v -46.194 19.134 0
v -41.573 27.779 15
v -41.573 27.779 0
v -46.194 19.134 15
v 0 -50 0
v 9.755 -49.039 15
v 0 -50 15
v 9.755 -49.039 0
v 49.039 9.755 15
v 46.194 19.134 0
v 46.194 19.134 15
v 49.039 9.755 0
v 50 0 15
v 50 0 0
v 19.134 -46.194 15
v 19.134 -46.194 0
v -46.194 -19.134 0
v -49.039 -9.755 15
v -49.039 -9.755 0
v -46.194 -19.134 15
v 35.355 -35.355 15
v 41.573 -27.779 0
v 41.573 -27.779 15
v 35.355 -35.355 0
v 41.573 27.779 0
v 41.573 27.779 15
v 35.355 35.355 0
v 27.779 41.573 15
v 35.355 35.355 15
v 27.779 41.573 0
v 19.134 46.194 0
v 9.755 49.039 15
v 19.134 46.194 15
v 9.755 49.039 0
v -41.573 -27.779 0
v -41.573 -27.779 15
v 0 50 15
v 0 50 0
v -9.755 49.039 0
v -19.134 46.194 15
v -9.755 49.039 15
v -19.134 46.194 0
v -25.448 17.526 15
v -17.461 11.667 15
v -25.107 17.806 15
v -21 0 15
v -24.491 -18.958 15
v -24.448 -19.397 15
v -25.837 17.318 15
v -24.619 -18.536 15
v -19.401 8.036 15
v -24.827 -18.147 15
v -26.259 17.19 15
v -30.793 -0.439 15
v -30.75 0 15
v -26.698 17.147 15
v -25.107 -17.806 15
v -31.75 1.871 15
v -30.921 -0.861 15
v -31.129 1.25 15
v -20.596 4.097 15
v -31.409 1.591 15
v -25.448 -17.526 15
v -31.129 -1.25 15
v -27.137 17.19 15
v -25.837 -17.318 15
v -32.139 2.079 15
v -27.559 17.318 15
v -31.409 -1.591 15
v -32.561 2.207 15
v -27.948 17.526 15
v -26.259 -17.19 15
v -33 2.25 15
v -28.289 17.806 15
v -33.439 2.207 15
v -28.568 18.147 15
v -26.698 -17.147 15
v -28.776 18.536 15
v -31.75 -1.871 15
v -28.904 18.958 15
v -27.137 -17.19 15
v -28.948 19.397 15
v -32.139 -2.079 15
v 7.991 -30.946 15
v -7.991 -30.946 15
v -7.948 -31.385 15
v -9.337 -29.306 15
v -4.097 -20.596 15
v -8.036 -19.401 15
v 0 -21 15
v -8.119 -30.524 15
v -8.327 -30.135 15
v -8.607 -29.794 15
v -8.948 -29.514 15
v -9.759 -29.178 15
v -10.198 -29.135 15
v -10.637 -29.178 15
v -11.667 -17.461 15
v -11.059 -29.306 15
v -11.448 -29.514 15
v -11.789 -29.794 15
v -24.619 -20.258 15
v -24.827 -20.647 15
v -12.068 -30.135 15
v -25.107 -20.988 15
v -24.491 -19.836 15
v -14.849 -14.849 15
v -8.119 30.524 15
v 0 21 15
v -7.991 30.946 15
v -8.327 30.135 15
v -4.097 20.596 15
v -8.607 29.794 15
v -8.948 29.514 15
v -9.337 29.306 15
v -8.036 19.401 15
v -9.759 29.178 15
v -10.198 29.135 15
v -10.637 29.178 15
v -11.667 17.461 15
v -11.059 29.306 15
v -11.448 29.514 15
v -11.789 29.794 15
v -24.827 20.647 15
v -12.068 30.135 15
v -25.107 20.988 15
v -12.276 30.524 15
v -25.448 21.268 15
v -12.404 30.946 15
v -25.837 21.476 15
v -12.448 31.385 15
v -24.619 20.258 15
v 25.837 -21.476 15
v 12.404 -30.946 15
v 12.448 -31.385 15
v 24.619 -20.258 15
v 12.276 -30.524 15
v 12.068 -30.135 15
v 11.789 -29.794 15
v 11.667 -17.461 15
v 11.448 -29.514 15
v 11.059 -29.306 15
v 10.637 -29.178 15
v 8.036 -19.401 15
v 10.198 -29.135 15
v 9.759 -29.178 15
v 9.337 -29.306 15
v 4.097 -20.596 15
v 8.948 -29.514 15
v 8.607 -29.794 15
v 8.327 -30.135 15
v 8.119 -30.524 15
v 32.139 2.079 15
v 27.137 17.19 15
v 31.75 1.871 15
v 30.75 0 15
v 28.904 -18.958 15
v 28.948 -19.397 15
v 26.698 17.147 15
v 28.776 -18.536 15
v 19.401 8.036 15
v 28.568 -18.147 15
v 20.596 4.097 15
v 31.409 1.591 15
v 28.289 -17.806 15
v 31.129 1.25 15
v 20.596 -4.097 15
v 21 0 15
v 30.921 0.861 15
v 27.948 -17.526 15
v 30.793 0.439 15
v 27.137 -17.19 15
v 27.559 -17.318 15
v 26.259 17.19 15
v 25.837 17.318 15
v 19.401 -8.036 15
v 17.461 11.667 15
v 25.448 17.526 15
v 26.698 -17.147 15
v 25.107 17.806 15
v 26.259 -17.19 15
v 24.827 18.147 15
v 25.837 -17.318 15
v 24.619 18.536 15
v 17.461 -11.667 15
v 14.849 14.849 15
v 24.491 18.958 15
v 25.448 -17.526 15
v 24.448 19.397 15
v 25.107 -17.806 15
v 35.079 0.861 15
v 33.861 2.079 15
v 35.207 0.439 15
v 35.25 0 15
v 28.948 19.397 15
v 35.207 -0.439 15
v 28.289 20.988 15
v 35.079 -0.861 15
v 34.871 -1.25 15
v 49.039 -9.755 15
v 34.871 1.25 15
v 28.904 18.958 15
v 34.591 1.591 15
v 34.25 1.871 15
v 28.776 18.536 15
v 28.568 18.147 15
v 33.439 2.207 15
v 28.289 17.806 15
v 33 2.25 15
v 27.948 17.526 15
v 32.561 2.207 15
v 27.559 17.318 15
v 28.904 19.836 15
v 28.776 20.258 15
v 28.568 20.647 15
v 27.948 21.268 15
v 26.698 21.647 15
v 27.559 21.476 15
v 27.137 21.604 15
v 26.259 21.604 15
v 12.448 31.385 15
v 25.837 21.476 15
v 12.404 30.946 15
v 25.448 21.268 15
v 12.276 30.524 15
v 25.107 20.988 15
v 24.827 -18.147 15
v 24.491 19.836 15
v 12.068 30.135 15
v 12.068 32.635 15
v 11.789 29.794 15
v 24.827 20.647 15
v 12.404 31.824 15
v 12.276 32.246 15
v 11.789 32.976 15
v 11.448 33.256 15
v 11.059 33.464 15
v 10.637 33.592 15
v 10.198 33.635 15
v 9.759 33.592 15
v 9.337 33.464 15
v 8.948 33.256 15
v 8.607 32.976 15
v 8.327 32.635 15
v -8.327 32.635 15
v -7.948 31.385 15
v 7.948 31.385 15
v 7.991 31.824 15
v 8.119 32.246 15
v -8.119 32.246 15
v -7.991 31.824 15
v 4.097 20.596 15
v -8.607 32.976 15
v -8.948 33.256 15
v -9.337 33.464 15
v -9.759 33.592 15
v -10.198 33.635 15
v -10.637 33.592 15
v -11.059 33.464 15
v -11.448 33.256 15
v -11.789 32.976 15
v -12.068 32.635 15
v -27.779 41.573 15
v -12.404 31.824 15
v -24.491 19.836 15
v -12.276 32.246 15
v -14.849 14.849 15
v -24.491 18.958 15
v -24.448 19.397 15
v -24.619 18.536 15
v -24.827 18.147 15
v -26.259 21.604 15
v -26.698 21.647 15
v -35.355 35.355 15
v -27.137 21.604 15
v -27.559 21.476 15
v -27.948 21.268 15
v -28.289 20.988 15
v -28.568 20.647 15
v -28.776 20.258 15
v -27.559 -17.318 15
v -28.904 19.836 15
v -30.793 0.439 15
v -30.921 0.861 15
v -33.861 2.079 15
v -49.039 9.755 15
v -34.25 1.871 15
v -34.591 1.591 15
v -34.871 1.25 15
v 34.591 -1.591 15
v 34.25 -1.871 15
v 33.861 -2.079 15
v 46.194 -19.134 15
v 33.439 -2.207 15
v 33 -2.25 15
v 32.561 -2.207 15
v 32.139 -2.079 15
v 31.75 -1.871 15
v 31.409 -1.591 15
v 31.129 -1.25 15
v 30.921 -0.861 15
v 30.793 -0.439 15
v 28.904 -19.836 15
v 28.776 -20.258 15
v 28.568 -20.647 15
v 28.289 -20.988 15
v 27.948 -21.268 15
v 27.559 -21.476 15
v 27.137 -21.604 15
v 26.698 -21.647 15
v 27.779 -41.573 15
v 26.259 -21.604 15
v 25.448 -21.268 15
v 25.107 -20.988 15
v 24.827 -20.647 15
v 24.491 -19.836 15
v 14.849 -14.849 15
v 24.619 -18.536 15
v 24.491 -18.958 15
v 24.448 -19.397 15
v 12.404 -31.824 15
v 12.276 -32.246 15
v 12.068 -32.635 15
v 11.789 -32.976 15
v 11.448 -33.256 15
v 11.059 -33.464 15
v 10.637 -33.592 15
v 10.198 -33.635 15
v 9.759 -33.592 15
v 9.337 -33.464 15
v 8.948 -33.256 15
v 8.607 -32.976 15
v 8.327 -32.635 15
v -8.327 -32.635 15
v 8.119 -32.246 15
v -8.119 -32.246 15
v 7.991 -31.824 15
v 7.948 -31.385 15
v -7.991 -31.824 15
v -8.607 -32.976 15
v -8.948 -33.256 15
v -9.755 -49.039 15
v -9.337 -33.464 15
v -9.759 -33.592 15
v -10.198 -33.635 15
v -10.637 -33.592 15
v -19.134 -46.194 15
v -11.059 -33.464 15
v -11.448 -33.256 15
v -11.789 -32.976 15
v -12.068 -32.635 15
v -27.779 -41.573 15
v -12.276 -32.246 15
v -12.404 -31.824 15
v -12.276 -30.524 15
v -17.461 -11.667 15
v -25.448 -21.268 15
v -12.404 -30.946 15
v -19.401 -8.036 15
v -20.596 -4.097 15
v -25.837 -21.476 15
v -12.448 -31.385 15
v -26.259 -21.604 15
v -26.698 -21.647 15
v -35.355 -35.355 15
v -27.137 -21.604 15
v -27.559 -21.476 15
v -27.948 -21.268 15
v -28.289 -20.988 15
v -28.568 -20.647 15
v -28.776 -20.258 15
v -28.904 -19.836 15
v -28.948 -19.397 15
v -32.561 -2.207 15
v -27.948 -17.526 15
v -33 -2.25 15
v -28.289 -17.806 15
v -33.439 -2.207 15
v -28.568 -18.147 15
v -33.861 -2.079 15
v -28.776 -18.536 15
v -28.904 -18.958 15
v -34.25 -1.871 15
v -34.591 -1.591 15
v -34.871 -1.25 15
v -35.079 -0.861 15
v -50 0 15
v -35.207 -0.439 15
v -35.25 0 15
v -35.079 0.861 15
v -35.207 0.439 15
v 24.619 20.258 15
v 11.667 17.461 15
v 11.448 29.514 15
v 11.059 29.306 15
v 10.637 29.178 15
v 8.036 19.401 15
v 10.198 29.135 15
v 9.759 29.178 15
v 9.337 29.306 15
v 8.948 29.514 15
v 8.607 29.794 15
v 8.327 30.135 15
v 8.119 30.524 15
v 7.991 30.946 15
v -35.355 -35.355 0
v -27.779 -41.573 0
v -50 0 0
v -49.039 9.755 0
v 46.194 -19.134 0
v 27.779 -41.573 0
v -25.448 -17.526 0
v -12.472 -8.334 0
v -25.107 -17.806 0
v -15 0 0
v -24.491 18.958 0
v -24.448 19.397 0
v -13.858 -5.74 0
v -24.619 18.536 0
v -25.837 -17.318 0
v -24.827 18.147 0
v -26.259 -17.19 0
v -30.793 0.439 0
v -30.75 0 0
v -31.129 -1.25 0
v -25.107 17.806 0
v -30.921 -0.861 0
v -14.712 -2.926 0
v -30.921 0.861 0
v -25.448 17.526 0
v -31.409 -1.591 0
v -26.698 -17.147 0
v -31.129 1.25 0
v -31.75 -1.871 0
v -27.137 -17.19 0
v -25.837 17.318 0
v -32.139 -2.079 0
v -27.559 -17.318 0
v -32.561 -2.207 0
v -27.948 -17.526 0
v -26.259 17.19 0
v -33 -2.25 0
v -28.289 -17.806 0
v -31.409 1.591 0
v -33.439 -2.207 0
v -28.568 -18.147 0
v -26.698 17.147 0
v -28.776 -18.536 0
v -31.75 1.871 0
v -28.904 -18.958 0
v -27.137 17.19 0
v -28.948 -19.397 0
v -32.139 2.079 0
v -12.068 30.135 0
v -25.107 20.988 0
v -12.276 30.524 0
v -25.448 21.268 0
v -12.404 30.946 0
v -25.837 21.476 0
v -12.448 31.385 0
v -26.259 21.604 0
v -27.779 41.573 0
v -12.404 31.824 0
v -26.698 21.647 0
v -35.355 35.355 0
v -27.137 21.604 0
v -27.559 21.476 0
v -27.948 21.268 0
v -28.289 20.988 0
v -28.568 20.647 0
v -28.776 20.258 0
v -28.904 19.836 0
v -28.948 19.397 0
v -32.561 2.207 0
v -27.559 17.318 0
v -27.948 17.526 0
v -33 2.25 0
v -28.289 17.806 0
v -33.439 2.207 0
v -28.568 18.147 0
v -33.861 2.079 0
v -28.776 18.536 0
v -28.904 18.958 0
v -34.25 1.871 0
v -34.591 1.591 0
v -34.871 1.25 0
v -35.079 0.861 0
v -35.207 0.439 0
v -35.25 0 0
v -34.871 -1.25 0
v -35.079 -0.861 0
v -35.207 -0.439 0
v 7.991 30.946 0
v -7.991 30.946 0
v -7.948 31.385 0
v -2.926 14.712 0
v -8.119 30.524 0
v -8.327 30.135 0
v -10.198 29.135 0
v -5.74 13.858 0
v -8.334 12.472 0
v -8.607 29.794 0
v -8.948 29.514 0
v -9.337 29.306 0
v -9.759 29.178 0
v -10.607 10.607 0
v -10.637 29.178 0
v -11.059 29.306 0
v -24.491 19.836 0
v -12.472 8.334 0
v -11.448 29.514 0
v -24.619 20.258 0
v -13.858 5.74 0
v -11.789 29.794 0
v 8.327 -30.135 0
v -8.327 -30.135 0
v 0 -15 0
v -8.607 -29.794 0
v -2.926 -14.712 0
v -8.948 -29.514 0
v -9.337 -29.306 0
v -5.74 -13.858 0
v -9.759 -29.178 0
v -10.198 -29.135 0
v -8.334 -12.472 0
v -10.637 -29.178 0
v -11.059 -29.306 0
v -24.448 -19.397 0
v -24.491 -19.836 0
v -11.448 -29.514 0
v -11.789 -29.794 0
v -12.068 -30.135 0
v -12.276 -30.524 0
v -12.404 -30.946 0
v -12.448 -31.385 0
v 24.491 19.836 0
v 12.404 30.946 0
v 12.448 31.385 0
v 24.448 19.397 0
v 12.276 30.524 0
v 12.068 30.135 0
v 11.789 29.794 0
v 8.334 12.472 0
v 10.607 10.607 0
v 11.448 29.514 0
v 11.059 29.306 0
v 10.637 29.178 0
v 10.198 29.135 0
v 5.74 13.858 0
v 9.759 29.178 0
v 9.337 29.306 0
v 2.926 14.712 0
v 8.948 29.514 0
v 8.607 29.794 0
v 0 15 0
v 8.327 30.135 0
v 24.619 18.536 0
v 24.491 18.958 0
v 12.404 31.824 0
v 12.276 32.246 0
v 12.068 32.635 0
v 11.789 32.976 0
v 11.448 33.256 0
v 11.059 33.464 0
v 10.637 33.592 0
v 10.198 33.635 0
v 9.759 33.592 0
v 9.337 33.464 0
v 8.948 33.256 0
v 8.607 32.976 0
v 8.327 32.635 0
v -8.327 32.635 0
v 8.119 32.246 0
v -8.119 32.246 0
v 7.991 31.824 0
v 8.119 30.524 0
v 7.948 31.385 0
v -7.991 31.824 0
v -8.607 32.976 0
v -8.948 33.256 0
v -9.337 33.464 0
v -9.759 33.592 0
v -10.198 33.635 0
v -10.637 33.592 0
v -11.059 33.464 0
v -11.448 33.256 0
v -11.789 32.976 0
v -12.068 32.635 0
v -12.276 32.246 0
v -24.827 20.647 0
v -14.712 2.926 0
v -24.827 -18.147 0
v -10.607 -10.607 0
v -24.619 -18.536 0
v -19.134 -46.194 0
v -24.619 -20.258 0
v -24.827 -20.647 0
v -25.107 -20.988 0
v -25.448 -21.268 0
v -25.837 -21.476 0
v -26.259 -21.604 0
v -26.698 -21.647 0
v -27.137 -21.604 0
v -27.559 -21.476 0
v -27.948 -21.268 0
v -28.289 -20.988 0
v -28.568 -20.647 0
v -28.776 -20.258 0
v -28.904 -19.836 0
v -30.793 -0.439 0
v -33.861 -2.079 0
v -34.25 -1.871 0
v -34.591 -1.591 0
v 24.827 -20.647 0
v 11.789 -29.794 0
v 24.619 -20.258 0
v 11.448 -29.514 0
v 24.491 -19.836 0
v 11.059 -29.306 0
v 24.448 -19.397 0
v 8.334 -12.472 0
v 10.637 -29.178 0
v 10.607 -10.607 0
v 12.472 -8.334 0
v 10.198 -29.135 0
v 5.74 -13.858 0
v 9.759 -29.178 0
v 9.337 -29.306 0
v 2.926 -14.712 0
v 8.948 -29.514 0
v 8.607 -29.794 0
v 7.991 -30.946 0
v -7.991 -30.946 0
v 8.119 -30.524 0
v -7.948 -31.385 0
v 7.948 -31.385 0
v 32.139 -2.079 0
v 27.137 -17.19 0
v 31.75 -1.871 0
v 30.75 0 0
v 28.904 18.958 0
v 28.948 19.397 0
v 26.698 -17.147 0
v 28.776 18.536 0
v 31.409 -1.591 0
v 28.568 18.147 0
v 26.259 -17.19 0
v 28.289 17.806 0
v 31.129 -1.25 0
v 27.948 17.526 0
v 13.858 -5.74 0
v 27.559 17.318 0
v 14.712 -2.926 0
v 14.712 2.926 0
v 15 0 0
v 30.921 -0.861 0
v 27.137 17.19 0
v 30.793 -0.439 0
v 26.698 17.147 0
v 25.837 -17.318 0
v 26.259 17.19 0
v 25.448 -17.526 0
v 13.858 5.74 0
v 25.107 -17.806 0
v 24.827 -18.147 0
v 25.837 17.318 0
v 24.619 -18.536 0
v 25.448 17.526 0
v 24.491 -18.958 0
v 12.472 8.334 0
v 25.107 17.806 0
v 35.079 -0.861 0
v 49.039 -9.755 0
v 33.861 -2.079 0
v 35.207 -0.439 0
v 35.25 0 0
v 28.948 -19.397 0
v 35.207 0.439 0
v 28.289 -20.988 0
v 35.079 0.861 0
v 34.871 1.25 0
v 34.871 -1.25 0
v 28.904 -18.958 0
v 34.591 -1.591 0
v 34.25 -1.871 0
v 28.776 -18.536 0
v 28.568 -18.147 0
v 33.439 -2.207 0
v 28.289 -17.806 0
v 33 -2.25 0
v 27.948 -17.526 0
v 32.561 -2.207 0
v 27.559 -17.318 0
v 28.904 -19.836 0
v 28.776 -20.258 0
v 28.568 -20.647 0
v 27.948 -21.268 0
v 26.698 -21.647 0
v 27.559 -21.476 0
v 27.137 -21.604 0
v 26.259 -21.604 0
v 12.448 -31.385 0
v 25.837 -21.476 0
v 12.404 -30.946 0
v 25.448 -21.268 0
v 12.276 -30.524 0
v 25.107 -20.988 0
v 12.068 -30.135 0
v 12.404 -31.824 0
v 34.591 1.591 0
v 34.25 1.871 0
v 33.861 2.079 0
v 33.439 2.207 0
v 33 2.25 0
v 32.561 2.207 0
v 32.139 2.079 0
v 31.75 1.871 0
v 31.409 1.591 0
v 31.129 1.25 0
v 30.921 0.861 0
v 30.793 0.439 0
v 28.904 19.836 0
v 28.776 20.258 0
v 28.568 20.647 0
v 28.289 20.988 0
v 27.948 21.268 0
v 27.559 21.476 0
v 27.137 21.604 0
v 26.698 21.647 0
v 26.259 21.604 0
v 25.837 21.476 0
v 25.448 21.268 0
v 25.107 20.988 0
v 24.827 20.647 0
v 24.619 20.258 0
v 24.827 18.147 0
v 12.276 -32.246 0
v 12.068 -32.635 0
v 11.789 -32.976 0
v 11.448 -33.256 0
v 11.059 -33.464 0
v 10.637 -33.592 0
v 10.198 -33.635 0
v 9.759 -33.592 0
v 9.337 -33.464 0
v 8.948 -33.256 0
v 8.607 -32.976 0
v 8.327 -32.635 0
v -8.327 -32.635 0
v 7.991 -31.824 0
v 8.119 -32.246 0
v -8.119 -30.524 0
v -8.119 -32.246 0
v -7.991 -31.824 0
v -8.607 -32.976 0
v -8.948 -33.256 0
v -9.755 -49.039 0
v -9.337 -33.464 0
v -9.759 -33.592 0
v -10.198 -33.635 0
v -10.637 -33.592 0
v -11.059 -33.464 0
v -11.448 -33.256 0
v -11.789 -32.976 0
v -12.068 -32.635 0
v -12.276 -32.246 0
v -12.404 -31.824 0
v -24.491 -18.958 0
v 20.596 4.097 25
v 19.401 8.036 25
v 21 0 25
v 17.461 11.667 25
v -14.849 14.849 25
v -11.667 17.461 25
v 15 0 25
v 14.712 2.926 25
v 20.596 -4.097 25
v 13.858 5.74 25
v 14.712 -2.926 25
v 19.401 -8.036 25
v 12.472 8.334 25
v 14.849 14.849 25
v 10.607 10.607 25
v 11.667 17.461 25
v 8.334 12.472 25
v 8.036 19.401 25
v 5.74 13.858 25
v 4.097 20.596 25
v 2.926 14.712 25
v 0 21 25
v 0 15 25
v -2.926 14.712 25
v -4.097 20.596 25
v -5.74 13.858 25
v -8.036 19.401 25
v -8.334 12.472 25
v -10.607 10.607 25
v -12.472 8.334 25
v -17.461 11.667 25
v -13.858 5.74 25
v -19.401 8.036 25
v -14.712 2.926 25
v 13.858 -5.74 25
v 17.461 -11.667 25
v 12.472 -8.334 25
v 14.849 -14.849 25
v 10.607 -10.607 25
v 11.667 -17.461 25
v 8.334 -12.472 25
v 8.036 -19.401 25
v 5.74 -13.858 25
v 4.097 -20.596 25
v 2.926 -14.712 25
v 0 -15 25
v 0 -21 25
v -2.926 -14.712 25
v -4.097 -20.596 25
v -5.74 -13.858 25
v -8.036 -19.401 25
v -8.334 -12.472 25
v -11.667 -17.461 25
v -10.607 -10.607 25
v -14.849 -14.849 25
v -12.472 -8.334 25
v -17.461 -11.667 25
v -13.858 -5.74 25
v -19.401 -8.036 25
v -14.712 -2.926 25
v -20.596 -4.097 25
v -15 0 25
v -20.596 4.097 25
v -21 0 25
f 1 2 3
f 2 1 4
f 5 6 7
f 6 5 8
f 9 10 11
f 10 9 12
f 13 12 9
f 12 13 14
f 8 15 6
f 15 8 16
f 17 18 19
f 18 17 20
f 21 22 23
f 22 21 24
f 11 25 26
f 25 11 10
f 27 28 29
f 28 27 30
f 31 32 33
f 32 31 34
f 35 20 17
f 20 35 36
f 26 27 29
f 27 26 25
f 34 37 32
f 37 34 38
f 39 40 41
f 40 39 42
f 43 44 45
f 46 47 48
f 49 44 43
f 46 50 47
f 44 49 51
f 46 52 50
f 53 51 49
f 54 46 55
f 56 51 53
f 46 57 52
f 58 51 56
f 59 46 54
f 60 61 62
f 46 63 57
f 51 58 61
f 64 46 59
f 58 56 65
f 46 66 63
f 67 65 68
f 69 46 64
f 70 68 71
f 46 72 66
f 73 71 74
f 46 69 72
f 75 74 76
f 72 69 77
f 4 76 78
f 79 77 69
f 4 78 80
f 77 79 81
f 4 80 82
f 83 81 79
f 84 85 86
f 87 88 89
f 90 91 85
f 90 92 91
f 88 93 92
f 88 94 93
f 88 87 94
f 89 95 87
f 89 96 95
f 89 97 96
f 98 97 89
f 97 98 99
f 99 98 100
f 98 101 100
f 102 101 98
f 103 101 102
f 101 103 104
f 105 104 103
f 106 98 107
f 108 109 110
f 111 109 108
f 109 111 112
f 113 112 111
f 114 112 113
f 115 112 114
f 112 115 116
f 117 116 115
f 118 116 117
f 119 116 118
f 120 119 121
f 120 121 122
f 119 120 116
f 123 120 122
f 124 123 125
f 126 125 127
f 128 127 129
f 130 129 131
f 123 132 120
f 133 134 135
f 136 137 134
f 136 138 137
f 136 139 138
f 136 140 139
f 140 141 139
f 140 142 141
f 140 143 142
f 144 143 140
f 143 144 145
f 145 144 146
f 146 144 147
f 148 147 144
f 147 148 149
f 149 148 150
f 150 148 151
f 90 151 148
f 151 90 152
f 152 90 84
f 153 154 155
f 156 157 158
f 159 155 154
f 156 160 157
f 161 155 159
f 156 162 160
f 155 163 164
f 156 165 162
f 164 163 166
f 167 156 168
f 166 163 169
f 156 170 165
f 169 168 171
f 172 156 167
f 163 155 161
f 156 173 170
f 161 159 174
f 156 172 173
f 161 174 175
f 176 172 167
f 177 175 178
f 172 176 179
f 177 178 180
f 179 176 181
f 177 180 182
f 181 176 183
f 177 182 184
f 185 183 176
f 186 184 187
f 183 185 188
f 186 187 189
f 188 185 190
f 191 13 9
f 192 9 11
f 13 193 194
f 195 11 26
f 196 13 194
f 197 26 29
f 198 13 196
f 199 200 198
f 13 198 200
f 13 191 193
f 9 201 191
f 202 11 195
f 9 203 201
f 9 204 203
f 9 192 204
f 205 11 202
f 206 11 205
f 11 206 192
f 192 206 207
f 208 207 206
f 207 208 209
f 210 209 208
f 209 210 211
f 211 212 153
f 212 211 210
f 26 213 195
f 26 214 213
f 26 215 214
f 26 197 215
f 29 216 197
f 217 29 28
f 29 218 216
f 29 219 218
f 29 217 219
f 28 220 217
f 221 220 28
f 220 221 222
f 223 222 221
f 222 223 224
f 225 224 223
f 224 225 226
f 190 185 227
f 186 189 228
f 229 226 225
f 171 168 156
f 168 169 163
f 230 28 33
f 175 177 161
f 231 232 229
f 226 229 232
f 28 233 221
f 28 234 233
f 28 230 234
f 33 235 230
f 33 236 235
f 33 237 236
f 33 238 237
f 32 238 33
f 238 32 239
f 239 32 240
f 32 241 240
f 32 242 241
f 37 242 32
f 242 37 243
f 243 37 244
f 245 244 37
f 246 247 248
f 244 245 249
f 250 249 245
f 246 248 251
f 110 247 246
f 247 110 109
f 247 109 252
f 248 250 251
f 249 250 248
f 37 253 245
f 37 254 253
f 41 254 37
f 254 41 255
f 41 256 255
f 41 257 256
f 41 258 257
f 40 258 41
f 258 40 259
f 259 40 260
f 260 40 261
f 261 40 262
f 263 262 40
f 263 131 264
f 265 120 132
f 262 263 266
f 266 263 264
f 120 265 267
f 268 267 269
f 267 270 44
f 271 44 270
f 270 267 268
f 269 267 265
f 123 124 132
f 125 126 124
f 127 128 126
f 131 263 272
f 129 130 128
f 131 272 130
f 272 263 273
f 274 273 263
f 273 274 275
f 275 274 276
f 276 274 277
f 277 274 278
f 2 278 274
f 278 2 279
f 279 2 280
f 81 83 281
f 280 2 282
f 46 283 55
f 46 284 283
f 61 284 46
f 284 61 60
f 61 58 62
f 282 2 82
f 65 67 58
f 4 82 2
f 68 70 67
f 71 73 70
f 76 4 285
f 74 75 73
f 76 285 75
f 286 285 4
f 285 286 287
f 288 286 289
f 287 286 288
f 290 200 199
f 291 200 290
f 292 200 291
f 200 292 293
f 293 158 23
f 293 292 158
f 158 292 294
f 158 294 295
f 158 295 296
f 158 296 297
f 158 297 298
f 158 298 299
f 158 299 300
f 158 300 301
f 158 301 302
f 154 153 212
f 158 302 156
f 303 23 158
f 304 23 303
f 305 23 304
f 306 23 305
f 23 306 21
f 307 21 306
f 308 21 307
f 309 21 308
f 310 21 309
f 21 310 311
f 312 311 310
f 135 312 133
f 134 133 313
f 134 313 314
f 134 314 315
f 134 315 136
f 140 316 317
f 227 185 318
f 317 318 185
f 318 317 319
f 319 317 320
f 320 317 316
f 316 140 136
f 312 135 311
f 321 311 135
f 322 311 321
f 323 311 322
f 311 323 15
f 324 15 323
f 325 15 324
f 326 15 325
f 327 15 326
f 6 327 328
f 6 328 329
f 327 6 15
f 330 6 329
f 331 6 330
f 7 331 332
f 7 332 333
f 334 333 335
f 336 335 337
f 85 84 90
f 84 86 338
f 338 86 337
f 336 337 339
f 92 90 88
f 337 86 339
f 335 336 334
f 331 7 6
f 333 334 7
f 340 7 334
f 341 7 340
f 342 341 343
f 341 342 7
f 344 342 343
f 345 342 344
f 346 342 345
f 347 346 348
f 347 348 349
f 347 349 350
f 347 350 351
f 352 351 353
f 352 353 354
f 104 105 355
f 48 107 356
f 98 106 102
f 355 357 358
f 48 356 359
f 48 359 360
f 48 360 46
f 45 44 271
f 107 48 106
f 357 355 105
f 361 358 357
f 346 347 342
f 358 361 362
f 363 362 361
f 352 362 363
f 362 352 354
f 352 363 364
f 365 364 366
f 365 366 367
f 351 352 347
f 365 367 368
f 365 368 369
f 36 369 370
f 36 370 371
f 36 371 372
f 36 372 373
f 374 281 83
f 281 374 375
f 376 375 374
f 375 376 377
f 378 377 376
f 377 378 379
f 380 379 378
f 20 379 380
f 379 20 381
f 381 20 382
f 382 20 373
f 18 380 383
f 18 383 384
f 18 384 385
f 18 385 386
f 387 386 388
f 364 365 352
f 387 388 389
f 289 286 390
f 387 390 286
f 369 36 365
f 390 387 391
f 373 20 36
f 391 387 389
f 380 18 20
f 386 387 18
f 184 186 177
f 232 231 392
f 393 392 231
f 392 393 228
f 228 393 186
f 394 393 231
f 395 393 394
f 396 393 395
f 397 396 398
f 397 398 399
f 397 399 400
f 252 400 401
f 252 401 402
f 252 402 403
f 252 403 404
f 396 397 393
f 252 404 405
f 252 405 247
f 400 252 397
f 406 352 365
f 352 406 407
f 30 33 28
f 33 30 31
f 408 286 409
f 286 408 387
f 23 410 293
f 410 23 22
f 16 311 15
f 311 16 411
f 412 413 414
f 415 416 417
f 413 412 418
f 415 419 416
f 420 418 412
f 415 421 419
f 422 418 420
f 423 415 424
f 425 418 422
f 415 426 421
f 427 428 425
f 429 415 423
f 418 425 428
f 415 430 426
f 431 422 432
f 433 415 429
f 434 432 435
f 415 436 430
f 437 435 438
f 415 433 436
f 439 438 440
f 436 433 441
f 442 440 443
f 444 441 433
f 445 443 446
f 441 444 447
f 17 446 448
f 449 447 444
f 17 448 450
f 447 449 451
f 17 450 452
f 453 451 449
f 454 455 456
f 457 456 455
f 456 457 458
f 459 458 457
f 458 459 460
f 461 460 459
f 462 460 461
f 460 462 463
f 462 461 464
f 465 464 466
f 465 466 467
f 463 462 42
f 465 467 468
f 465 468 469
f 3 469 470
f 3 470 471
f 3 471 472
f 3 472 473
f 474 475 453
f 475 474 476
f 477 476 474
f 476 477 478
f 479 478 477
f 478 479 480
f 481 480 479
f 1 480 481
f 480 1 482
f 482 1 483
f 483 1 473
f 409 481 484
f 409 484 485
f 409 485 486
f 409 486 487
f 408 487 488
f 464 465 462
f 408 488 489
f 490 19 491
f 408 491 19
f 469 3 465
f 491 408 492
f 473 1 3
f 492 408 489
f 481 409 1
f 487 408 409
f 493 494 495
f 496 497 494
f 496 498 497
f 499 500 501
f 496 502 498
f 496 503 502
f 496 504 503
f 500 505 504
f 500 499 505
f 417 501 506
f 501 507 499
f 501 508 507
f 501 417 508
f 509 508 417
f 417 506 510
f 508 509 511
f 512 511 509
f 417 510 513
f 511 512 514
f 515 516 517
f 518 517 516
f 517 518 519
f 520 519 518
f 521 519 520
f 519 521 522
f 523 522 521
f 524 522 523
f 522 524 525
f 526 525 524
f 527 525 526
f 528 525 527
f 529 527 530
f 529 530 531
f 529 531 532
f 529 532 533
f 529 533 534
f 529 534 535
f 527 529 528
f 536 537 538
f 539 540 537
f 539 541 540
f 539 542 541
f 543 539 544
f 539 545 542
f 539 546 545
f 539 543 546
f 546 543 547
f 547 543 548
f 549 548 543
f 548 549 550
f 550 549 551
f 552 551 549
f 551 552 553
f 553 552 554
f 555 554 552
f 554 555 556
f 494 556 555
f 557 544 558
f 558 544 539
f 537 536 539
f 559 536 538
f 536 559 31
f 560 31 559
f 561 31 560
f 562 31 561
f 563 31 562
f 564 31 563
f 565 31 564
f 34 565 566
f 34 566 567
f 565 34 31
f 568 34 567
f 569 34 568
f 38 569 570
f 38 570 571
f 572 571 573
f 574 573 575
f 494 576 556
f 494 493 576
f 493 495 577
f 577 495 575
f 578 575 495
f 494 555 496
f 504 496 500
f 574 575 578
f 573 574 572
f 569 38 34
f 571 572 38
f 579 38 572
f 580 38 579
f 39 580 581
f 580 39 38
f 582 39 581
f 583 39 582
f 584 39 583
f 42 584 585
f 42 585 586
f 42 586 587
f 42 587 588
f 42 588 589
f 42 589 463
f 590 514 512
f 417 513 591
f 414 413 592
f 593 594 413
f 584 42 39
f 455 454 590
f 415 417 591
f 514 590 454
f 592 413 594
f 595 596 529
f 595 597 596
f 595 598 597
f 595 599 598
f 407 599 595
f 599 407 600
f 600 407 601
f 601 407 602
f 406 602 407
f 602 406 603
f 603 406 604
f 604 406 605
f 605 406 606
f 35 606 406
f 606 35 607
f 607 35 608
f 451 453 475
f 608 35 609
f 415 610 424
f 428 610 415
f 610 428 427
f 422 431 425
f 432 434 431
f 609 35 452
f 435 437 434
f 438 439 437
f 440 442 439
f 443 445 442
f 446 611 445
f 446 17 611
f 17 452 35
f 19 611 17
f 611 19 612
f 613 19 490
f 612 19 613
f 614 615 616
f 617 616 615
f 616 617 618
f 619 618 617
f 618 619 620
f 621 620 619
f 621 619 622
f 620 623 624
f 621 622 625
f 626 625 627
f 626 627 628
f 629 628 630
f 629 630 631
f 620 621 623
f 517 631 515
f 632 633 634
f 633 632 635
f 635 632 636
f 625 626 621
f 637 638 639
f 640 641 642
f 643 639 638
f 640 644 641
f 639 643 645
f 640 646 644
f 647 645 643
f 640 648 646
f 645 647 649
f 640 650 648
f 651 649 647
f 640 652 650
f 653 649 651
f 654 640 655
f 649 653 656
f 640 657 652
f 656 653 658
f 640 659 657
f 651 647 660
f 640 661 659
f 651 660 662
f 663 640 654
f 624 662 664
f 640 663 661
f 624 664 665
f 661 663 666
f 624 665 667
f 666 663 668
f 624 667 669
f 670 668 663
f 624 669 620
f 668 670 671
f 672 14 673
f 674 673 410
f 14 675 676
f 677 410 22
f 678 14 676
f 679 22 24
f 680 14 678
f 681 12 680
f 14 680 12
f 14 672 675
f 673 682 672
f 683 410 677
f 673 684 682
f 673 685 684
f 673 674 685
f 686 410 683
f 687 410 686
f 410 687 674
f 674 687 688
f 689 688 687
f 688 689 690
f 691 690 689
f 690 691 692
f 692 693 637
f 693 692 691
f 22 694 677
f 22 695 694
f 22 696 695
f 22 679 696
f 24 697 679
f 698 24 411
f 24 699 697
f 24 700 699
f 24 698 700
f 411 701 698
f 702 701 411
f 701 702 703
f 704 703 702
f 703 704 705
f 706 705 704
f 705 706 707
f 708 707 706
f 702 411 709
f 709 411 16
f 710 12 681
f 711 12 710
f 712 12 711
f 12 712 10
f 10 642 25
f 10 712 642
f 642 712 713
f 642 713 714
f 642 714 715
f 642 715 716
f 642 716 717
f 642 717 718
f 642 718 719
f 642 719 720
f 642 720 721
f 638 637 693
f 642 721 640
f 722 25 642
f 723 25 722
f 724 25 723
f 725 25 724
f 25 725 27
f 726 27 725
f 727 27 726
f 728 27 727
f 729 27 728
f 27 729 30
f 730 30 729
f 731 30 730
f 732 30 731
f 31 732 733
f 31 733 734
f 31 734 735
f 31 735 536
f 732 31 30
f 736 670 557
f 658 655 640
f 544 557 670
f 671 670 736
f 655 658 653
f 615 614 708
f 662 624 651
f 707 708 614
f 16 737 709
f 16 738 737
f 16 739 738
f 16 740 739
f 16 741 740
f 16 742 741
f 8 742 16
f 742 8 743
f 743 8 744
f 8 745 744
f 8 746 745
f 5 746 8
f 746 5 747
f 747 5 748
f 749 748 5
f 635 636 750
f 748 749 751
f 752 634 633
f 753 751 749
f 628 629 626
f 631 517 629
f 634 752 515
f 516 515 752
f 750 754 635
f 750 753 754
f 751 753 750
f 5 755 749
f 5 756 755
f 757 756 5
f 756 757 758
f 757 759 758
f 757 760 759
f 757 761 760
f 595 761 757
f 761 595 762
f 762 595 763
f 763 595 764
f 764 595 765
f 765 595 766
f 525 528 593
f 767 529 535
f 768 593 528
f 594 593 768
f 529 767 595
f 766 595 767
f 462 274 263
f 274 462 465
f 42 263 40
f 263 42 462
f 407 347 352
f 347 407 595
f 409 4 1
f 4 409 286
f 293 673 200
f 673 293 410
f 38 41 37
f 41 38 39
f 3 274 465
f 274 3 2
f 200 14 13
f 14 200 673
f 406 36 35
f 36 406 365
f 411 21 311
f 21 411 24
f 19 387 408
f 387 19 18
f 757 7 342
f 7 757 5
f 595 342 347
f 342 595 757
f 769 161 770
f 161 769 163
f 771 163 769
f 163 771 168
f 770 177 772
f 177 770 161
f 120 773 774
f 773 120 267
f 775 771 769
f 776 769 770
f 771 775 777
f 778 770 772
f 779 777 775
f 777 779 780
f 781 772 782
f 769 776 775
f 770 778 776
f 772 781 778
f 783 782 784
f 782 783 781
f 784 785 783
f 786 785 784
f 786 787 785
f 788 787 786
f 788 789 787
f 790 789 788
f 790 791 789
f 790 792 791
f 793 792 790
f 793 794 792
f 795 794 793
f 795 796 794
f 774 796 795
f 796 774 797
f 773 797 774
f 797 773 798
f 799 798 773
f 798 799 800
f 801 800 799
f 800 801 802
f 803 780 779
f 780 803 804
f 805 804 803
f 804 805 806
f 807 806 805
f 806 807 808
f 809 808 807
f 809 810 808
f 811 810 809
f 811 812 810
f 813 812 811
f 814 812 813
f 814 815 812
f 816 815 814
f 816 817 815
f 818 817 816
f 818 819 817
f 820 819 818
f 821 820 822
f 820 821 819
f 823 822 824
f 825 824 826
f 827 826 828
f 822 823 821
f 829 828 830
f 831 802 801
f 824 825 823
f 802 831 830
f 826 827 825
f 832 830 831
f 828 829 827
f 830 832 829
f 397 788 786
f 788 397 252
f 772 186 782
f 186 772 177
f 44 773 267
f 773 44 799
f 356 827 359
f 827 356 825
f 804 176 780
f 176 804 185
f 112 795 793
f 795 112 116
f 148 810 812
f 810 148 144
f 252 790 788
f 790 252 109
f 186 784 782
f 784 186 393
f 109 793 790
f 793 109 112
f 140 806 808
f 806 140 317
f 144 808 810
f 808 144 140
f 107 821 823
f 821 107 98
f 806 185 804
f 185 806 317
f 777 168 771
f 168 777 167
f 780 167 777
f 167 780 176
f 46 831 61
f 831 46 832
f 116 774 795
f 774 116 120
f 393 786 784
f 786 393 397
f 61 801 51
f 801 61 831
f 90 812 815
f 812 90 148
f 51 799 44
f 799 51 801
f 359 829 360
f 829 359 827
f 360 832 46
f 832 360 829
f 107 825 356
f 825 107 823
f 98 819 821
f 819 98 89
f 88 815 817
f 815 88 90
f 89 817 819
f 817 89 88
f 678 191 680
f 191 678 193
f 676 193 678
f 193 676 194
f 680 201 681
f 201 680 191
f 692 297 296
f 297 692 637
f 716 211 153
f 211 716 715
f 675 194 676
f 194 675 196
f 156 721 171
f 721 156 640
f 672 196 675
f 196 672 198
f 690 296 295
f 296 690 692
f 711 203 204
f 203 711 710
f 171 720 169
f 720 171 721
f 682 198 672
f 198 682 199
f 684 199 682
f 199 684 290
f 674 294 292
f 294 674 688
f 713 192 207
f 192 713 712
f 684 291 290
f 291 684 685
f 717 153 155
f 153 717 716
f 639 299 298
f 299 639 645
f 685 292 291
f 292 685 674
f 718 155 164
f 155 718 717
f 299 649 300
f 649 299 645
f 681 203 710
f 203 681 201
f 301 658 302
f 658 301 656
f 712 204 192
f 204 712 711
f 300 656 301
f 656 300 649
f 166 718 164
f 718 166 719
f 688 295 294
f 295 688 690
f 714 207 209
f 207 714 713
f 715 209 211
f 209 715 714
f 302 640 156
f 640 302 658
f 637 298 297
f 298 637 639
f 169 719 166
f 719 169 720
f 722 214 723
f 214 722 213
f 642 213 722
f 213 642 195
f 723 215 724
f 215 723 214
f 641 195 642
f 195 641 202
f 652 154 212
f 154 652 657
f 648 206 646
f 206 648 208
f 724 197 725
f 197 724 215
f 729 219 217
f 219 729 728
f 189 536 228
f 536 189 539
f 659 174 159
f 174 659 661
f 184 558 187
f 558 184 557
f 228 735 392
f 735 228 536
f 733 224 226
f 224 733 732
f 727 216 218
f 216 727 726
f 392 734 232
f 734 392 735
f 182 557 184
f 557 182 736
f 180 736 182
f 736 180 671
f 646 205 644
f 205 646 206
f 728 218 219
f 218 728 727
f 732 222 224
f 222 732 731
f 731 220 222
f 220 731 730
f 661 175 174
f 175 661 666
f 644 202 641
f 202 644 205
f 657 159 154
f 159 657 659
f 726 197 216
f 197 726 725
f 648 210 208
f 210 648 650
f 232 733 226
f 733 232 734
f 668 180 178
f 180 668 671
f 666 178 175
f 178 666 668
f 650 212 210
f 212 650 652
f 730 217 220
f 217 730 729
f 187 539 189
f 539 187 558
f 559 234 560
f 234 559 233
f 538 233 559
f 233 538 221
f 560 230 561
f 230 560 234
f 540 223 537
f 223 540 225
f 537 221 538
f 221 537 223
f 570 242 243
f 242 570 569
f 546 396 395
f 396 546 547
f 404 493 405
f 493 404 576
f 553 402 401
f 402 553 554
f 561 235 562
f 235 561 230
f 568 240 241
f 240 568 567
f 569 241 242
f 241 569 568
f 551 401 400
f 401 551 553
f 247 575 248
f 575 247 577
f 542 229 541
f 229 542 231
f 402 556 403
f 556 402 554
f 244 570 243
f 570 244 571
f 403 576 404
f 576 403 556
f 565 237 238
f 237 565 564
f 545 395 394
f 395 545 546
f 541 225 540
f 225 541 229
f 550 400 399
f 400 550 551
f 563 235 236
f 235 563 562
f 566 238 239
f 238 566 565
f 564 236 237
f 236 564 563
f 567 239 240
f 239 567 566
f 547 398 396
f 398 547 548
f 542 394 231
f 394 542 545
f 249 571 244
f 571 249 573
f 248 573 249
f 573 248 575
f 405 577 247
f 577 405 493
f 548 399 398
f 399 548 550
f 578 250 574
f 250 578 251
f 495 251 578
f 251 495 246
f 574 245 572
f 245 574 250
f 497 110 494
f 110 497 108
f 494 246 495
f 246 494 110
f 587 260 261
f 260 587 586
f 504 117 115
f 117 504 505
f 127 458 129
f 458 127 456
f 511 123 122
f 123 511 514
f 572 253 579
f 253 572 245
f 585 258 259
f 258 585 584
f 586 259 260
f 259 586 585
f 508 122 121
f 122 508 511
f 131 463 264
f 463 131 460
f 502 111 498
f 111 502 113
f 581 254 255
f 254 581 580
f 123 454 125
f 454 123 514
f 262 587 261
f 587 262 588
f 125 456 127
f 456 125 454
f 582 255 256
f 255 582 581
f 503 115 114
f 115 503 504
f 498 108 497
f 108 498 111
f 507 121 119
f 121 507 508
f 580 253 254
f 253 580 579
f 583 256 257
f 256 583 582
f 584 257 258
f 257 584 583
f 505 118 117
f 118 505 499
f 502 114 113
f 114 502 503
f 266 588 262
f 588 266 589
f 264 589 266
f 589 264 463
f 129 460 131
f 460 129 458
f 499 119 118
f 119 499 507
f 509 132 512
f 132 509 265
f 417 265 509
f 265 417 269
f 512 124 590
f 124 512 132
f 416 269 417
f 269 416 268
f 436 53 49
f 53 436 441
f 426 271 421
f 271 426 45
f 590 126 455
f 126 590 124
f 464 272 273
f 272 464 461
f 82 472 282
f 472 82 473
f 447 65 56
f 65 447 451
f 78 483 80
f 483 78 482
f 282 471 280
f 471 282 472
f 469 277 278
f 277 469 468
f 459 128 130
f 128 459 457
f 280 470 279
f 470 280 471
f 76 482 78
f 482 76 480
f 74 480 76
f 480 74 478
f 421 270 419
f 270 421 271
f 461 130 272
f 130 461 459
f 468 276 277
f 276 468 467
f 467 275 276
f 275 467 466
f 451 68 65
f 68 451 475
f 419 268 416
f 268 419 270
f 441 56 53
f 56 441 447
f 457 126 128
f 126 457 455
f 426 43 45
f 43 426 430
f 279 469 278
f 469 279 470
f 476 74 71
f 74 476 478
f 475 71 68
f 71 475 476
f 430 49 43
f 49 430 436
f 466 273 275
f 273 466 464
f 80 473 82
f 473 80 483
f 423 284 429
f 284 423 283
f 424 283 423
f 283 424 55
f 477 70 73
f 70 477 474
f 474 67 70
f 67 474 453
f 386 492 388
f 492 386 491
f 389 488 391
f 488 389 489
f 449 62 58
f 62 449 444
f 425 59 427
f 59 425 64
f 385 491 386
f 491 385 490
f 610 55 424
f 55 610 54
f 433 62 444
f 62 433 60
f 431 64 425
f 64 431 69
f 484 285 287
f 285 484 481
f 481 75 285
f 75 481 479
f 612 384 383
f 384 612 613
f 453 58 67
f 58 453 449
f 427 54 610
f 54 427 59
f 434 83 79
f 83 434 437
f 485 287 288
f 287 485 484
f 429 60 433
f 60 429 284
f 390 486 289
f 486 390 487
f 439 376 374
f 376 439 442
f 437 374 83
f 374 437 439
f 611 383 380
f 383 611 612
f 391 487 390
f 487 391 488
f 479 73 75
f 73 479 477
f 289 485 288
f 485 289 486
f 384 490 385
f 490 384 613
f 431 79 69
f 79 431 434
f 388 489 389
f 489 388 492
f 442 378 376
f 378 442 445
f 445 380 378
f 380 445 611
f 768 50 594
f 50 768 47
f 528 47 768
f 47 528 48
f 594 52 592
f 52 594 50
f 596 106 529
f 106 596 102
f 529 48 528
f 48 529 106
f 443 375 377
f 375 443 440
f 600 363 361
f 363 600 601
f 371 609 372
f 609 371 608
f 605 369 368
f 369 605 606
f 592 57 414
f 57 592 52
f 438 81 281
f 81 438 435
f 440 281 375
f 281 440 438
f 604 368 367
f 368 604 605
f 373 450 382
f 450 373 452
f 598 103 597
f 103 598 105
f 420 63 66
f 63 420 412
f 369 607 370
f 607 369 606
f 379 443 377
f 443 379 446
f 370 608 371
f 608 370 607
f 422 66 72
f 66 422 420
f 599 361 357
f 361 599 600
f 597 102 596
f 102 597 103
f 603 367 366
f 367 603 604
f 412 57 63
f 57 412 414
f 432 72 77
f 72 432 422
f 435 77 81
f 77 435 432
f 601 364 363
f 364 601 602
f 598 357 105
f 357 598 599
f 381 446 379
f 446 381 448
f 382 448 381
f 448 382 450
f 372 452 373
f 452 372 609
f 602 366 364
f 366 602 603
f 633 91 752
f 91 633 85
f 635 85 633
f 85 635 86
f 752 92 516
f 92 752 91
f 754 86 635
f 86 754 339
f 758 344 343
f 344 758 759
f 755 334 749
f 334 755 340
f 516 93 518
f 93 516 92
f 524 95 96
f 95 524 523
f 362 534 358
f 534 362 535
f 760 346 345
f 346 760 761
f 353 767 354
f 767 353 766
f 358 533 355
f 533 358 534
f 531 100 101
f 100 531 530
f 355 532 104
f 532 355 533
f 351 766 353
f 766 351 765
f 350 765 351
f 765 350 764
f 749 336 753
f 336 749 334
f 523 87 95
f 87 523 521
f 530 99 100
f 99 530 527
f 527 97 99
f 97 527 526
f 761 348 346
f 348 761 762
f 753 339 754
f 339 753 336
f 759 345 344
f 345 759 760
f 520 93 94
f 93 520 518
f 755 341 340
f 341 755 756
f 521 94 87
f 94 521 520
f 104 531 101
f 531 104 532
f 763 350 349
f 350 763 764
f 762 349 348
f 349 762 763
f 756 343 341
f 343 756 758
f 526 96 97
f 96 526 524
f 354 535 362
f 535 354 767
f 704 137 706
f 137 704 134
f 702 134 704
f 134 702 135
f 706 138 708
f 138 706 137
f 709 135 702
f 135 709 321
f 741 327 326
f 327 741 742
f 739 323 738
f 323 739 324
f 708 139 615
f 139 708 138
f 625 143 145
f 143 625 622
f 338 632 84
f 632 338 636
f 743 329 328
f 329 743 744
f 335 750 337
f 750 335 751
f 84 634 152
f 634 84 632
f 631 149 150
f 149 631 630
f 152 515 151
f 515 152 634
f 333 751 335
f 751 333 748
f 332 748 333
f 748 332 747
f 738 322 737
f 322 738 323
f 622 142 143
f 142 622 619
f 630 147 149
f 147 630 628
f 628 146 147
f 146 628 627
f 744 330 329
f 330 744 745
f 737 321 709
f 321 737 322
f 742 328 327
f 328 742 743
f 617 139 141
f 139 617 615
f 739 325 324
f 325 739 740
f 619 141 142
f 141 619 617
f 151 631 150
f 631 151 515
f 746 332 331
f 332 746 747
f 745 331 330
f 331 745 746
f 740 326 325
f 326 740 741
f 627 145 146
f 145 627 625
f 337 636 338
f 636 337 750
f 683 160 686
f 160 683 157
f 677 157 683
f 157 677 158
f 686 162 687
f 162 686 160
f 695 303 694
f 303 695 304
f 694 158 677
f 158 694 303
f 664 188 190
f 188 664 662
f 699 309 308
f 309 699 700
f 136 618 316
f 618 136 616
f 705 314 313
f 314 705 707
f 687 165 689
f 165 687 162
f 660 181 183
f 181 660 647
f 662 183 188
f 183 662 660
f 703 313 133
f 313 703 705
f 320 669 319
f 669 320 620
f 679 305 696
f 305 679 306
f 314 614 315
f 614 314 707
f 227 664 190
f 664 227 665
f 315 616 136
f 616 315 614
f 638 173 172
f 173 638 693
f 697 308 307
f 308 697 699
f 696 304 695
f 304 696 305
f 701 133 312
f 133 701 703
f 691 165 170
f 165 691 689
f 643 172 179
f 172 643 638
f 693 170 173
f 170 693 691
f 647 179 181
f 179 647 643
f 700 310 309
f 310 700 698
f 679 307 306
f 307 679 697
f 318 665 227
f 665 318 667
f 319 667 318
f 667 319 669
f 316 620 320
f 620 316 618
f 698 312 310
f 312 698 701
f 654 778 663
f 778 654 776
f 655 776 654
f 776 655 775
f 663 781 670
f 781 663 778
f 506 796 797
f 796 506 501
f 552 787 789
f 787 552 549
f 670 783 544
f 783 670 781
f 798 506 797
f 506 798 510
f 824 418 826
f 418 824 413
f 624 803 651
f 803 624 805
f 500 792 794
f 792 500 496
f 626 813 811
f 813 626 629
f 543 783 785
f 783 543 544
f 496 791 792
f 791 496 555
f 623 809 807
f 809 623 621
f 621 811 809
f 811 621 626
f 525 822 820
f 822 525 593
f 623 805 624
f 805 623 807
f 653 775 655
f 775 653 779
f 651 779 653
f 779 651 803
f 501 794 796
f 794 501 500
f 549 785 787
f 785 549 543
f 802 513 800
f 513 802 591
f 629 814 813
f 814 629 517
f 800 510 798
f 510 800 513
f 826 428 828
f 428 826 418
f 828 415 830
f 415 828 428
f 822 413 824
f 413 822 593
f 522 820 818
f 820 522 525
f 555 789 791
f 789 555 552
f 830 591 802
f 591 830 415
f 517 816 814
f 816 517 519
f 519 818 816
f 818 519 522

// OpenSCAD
$fn = 32;
// ----------------------------------------------------------------------
// Flange Ø100 x 15
// 10 holes on a Ø66 bolt circle, bolted joints
// ----------------------------------------------------------------------

// --- parameters (mm) ---
flange_d = 100;  // outside diameter of the flange
thickness = 15;  // flange thickness
holes = 10;      // number of bolt holes
pcd = 66;        // bolt circle diameter
start_deg = 0;   // angle of the first hole, from +X
hole_d = 4.5;    // bolt hole diameter
bore_d = 30;     // central through bore
hub_d = 42;      // hub outside diameter
hub_h = 10;      // hub height above the flange face (0 = no hub)

// --- derived feature positions (mm) ---
height = thickness + hub_h;  // = 25   overall height of the part
pcd_r = pcd / 2;             // = 33   bolt circle radius
hole_step = 360 / holes;     // = 36   angular pitch
feature_centers = [
  [pcd_r * cos(start_deg + 0 * hole_step), pcd_r * sin(start_deg + 0 * hole_step)],
  [pcd_r * cos(start_deg + 1 * hole_step), pcd_r * sin(start_deg + 1 * hole_step)],
  [pcd_r * cos(start_deg + 2 * hole_step), pcd_r * sin(start_deg + 2 * hole_step)],
  [pcd_r * cos(start_deg + 3 * hole_step), pcd_r * sin(start_deg + 3 * hole_step)],
  [pcd_r * cos(start_deg + 4 * hole_step), pcd_r * sin(start_deg + 4 * hole_step)],
  [pcd_r * cos(start_deg + 5 * hole_step), pcd_r * sin(start_deg + 5 * hole_step)],
  [pcd_r * cos(start_deg + 6 * hole_step), pcd_r * sin(start_deg + 6 * hole_step)],
  [pcd_r * cos(start_deg + 7 * hole_step), pcd_r * sin(start_deg + 7 * hole_step)],
  [pcd_r * cos(start_deg + 8 * hole_step), pcd_r * sin(start_deg + 8 * hole_step)],
  [pcd_r * cos(start_deg + 9 * hole_step), pcd_r * sin(start_deg + 9 * hole_step)]
];   // bolt hole centres on the pitch circle

// flange disc, every hole and the bore cut straight through
difference() {
  union() {
    cylinder(d = flange_d, h = thickness);
    cylinder(d = hub_d, h = height);  // hub, overlapped into the flange
  }
  translate([0, 0, -1]) cylinder(d = bore_d, h = height + 2);  // bore, through
  for (centre = feature_centers)
    translate([centre[0], centre[1], -1]) cylinder(d = hole_d, h = thickness + 2);
}
